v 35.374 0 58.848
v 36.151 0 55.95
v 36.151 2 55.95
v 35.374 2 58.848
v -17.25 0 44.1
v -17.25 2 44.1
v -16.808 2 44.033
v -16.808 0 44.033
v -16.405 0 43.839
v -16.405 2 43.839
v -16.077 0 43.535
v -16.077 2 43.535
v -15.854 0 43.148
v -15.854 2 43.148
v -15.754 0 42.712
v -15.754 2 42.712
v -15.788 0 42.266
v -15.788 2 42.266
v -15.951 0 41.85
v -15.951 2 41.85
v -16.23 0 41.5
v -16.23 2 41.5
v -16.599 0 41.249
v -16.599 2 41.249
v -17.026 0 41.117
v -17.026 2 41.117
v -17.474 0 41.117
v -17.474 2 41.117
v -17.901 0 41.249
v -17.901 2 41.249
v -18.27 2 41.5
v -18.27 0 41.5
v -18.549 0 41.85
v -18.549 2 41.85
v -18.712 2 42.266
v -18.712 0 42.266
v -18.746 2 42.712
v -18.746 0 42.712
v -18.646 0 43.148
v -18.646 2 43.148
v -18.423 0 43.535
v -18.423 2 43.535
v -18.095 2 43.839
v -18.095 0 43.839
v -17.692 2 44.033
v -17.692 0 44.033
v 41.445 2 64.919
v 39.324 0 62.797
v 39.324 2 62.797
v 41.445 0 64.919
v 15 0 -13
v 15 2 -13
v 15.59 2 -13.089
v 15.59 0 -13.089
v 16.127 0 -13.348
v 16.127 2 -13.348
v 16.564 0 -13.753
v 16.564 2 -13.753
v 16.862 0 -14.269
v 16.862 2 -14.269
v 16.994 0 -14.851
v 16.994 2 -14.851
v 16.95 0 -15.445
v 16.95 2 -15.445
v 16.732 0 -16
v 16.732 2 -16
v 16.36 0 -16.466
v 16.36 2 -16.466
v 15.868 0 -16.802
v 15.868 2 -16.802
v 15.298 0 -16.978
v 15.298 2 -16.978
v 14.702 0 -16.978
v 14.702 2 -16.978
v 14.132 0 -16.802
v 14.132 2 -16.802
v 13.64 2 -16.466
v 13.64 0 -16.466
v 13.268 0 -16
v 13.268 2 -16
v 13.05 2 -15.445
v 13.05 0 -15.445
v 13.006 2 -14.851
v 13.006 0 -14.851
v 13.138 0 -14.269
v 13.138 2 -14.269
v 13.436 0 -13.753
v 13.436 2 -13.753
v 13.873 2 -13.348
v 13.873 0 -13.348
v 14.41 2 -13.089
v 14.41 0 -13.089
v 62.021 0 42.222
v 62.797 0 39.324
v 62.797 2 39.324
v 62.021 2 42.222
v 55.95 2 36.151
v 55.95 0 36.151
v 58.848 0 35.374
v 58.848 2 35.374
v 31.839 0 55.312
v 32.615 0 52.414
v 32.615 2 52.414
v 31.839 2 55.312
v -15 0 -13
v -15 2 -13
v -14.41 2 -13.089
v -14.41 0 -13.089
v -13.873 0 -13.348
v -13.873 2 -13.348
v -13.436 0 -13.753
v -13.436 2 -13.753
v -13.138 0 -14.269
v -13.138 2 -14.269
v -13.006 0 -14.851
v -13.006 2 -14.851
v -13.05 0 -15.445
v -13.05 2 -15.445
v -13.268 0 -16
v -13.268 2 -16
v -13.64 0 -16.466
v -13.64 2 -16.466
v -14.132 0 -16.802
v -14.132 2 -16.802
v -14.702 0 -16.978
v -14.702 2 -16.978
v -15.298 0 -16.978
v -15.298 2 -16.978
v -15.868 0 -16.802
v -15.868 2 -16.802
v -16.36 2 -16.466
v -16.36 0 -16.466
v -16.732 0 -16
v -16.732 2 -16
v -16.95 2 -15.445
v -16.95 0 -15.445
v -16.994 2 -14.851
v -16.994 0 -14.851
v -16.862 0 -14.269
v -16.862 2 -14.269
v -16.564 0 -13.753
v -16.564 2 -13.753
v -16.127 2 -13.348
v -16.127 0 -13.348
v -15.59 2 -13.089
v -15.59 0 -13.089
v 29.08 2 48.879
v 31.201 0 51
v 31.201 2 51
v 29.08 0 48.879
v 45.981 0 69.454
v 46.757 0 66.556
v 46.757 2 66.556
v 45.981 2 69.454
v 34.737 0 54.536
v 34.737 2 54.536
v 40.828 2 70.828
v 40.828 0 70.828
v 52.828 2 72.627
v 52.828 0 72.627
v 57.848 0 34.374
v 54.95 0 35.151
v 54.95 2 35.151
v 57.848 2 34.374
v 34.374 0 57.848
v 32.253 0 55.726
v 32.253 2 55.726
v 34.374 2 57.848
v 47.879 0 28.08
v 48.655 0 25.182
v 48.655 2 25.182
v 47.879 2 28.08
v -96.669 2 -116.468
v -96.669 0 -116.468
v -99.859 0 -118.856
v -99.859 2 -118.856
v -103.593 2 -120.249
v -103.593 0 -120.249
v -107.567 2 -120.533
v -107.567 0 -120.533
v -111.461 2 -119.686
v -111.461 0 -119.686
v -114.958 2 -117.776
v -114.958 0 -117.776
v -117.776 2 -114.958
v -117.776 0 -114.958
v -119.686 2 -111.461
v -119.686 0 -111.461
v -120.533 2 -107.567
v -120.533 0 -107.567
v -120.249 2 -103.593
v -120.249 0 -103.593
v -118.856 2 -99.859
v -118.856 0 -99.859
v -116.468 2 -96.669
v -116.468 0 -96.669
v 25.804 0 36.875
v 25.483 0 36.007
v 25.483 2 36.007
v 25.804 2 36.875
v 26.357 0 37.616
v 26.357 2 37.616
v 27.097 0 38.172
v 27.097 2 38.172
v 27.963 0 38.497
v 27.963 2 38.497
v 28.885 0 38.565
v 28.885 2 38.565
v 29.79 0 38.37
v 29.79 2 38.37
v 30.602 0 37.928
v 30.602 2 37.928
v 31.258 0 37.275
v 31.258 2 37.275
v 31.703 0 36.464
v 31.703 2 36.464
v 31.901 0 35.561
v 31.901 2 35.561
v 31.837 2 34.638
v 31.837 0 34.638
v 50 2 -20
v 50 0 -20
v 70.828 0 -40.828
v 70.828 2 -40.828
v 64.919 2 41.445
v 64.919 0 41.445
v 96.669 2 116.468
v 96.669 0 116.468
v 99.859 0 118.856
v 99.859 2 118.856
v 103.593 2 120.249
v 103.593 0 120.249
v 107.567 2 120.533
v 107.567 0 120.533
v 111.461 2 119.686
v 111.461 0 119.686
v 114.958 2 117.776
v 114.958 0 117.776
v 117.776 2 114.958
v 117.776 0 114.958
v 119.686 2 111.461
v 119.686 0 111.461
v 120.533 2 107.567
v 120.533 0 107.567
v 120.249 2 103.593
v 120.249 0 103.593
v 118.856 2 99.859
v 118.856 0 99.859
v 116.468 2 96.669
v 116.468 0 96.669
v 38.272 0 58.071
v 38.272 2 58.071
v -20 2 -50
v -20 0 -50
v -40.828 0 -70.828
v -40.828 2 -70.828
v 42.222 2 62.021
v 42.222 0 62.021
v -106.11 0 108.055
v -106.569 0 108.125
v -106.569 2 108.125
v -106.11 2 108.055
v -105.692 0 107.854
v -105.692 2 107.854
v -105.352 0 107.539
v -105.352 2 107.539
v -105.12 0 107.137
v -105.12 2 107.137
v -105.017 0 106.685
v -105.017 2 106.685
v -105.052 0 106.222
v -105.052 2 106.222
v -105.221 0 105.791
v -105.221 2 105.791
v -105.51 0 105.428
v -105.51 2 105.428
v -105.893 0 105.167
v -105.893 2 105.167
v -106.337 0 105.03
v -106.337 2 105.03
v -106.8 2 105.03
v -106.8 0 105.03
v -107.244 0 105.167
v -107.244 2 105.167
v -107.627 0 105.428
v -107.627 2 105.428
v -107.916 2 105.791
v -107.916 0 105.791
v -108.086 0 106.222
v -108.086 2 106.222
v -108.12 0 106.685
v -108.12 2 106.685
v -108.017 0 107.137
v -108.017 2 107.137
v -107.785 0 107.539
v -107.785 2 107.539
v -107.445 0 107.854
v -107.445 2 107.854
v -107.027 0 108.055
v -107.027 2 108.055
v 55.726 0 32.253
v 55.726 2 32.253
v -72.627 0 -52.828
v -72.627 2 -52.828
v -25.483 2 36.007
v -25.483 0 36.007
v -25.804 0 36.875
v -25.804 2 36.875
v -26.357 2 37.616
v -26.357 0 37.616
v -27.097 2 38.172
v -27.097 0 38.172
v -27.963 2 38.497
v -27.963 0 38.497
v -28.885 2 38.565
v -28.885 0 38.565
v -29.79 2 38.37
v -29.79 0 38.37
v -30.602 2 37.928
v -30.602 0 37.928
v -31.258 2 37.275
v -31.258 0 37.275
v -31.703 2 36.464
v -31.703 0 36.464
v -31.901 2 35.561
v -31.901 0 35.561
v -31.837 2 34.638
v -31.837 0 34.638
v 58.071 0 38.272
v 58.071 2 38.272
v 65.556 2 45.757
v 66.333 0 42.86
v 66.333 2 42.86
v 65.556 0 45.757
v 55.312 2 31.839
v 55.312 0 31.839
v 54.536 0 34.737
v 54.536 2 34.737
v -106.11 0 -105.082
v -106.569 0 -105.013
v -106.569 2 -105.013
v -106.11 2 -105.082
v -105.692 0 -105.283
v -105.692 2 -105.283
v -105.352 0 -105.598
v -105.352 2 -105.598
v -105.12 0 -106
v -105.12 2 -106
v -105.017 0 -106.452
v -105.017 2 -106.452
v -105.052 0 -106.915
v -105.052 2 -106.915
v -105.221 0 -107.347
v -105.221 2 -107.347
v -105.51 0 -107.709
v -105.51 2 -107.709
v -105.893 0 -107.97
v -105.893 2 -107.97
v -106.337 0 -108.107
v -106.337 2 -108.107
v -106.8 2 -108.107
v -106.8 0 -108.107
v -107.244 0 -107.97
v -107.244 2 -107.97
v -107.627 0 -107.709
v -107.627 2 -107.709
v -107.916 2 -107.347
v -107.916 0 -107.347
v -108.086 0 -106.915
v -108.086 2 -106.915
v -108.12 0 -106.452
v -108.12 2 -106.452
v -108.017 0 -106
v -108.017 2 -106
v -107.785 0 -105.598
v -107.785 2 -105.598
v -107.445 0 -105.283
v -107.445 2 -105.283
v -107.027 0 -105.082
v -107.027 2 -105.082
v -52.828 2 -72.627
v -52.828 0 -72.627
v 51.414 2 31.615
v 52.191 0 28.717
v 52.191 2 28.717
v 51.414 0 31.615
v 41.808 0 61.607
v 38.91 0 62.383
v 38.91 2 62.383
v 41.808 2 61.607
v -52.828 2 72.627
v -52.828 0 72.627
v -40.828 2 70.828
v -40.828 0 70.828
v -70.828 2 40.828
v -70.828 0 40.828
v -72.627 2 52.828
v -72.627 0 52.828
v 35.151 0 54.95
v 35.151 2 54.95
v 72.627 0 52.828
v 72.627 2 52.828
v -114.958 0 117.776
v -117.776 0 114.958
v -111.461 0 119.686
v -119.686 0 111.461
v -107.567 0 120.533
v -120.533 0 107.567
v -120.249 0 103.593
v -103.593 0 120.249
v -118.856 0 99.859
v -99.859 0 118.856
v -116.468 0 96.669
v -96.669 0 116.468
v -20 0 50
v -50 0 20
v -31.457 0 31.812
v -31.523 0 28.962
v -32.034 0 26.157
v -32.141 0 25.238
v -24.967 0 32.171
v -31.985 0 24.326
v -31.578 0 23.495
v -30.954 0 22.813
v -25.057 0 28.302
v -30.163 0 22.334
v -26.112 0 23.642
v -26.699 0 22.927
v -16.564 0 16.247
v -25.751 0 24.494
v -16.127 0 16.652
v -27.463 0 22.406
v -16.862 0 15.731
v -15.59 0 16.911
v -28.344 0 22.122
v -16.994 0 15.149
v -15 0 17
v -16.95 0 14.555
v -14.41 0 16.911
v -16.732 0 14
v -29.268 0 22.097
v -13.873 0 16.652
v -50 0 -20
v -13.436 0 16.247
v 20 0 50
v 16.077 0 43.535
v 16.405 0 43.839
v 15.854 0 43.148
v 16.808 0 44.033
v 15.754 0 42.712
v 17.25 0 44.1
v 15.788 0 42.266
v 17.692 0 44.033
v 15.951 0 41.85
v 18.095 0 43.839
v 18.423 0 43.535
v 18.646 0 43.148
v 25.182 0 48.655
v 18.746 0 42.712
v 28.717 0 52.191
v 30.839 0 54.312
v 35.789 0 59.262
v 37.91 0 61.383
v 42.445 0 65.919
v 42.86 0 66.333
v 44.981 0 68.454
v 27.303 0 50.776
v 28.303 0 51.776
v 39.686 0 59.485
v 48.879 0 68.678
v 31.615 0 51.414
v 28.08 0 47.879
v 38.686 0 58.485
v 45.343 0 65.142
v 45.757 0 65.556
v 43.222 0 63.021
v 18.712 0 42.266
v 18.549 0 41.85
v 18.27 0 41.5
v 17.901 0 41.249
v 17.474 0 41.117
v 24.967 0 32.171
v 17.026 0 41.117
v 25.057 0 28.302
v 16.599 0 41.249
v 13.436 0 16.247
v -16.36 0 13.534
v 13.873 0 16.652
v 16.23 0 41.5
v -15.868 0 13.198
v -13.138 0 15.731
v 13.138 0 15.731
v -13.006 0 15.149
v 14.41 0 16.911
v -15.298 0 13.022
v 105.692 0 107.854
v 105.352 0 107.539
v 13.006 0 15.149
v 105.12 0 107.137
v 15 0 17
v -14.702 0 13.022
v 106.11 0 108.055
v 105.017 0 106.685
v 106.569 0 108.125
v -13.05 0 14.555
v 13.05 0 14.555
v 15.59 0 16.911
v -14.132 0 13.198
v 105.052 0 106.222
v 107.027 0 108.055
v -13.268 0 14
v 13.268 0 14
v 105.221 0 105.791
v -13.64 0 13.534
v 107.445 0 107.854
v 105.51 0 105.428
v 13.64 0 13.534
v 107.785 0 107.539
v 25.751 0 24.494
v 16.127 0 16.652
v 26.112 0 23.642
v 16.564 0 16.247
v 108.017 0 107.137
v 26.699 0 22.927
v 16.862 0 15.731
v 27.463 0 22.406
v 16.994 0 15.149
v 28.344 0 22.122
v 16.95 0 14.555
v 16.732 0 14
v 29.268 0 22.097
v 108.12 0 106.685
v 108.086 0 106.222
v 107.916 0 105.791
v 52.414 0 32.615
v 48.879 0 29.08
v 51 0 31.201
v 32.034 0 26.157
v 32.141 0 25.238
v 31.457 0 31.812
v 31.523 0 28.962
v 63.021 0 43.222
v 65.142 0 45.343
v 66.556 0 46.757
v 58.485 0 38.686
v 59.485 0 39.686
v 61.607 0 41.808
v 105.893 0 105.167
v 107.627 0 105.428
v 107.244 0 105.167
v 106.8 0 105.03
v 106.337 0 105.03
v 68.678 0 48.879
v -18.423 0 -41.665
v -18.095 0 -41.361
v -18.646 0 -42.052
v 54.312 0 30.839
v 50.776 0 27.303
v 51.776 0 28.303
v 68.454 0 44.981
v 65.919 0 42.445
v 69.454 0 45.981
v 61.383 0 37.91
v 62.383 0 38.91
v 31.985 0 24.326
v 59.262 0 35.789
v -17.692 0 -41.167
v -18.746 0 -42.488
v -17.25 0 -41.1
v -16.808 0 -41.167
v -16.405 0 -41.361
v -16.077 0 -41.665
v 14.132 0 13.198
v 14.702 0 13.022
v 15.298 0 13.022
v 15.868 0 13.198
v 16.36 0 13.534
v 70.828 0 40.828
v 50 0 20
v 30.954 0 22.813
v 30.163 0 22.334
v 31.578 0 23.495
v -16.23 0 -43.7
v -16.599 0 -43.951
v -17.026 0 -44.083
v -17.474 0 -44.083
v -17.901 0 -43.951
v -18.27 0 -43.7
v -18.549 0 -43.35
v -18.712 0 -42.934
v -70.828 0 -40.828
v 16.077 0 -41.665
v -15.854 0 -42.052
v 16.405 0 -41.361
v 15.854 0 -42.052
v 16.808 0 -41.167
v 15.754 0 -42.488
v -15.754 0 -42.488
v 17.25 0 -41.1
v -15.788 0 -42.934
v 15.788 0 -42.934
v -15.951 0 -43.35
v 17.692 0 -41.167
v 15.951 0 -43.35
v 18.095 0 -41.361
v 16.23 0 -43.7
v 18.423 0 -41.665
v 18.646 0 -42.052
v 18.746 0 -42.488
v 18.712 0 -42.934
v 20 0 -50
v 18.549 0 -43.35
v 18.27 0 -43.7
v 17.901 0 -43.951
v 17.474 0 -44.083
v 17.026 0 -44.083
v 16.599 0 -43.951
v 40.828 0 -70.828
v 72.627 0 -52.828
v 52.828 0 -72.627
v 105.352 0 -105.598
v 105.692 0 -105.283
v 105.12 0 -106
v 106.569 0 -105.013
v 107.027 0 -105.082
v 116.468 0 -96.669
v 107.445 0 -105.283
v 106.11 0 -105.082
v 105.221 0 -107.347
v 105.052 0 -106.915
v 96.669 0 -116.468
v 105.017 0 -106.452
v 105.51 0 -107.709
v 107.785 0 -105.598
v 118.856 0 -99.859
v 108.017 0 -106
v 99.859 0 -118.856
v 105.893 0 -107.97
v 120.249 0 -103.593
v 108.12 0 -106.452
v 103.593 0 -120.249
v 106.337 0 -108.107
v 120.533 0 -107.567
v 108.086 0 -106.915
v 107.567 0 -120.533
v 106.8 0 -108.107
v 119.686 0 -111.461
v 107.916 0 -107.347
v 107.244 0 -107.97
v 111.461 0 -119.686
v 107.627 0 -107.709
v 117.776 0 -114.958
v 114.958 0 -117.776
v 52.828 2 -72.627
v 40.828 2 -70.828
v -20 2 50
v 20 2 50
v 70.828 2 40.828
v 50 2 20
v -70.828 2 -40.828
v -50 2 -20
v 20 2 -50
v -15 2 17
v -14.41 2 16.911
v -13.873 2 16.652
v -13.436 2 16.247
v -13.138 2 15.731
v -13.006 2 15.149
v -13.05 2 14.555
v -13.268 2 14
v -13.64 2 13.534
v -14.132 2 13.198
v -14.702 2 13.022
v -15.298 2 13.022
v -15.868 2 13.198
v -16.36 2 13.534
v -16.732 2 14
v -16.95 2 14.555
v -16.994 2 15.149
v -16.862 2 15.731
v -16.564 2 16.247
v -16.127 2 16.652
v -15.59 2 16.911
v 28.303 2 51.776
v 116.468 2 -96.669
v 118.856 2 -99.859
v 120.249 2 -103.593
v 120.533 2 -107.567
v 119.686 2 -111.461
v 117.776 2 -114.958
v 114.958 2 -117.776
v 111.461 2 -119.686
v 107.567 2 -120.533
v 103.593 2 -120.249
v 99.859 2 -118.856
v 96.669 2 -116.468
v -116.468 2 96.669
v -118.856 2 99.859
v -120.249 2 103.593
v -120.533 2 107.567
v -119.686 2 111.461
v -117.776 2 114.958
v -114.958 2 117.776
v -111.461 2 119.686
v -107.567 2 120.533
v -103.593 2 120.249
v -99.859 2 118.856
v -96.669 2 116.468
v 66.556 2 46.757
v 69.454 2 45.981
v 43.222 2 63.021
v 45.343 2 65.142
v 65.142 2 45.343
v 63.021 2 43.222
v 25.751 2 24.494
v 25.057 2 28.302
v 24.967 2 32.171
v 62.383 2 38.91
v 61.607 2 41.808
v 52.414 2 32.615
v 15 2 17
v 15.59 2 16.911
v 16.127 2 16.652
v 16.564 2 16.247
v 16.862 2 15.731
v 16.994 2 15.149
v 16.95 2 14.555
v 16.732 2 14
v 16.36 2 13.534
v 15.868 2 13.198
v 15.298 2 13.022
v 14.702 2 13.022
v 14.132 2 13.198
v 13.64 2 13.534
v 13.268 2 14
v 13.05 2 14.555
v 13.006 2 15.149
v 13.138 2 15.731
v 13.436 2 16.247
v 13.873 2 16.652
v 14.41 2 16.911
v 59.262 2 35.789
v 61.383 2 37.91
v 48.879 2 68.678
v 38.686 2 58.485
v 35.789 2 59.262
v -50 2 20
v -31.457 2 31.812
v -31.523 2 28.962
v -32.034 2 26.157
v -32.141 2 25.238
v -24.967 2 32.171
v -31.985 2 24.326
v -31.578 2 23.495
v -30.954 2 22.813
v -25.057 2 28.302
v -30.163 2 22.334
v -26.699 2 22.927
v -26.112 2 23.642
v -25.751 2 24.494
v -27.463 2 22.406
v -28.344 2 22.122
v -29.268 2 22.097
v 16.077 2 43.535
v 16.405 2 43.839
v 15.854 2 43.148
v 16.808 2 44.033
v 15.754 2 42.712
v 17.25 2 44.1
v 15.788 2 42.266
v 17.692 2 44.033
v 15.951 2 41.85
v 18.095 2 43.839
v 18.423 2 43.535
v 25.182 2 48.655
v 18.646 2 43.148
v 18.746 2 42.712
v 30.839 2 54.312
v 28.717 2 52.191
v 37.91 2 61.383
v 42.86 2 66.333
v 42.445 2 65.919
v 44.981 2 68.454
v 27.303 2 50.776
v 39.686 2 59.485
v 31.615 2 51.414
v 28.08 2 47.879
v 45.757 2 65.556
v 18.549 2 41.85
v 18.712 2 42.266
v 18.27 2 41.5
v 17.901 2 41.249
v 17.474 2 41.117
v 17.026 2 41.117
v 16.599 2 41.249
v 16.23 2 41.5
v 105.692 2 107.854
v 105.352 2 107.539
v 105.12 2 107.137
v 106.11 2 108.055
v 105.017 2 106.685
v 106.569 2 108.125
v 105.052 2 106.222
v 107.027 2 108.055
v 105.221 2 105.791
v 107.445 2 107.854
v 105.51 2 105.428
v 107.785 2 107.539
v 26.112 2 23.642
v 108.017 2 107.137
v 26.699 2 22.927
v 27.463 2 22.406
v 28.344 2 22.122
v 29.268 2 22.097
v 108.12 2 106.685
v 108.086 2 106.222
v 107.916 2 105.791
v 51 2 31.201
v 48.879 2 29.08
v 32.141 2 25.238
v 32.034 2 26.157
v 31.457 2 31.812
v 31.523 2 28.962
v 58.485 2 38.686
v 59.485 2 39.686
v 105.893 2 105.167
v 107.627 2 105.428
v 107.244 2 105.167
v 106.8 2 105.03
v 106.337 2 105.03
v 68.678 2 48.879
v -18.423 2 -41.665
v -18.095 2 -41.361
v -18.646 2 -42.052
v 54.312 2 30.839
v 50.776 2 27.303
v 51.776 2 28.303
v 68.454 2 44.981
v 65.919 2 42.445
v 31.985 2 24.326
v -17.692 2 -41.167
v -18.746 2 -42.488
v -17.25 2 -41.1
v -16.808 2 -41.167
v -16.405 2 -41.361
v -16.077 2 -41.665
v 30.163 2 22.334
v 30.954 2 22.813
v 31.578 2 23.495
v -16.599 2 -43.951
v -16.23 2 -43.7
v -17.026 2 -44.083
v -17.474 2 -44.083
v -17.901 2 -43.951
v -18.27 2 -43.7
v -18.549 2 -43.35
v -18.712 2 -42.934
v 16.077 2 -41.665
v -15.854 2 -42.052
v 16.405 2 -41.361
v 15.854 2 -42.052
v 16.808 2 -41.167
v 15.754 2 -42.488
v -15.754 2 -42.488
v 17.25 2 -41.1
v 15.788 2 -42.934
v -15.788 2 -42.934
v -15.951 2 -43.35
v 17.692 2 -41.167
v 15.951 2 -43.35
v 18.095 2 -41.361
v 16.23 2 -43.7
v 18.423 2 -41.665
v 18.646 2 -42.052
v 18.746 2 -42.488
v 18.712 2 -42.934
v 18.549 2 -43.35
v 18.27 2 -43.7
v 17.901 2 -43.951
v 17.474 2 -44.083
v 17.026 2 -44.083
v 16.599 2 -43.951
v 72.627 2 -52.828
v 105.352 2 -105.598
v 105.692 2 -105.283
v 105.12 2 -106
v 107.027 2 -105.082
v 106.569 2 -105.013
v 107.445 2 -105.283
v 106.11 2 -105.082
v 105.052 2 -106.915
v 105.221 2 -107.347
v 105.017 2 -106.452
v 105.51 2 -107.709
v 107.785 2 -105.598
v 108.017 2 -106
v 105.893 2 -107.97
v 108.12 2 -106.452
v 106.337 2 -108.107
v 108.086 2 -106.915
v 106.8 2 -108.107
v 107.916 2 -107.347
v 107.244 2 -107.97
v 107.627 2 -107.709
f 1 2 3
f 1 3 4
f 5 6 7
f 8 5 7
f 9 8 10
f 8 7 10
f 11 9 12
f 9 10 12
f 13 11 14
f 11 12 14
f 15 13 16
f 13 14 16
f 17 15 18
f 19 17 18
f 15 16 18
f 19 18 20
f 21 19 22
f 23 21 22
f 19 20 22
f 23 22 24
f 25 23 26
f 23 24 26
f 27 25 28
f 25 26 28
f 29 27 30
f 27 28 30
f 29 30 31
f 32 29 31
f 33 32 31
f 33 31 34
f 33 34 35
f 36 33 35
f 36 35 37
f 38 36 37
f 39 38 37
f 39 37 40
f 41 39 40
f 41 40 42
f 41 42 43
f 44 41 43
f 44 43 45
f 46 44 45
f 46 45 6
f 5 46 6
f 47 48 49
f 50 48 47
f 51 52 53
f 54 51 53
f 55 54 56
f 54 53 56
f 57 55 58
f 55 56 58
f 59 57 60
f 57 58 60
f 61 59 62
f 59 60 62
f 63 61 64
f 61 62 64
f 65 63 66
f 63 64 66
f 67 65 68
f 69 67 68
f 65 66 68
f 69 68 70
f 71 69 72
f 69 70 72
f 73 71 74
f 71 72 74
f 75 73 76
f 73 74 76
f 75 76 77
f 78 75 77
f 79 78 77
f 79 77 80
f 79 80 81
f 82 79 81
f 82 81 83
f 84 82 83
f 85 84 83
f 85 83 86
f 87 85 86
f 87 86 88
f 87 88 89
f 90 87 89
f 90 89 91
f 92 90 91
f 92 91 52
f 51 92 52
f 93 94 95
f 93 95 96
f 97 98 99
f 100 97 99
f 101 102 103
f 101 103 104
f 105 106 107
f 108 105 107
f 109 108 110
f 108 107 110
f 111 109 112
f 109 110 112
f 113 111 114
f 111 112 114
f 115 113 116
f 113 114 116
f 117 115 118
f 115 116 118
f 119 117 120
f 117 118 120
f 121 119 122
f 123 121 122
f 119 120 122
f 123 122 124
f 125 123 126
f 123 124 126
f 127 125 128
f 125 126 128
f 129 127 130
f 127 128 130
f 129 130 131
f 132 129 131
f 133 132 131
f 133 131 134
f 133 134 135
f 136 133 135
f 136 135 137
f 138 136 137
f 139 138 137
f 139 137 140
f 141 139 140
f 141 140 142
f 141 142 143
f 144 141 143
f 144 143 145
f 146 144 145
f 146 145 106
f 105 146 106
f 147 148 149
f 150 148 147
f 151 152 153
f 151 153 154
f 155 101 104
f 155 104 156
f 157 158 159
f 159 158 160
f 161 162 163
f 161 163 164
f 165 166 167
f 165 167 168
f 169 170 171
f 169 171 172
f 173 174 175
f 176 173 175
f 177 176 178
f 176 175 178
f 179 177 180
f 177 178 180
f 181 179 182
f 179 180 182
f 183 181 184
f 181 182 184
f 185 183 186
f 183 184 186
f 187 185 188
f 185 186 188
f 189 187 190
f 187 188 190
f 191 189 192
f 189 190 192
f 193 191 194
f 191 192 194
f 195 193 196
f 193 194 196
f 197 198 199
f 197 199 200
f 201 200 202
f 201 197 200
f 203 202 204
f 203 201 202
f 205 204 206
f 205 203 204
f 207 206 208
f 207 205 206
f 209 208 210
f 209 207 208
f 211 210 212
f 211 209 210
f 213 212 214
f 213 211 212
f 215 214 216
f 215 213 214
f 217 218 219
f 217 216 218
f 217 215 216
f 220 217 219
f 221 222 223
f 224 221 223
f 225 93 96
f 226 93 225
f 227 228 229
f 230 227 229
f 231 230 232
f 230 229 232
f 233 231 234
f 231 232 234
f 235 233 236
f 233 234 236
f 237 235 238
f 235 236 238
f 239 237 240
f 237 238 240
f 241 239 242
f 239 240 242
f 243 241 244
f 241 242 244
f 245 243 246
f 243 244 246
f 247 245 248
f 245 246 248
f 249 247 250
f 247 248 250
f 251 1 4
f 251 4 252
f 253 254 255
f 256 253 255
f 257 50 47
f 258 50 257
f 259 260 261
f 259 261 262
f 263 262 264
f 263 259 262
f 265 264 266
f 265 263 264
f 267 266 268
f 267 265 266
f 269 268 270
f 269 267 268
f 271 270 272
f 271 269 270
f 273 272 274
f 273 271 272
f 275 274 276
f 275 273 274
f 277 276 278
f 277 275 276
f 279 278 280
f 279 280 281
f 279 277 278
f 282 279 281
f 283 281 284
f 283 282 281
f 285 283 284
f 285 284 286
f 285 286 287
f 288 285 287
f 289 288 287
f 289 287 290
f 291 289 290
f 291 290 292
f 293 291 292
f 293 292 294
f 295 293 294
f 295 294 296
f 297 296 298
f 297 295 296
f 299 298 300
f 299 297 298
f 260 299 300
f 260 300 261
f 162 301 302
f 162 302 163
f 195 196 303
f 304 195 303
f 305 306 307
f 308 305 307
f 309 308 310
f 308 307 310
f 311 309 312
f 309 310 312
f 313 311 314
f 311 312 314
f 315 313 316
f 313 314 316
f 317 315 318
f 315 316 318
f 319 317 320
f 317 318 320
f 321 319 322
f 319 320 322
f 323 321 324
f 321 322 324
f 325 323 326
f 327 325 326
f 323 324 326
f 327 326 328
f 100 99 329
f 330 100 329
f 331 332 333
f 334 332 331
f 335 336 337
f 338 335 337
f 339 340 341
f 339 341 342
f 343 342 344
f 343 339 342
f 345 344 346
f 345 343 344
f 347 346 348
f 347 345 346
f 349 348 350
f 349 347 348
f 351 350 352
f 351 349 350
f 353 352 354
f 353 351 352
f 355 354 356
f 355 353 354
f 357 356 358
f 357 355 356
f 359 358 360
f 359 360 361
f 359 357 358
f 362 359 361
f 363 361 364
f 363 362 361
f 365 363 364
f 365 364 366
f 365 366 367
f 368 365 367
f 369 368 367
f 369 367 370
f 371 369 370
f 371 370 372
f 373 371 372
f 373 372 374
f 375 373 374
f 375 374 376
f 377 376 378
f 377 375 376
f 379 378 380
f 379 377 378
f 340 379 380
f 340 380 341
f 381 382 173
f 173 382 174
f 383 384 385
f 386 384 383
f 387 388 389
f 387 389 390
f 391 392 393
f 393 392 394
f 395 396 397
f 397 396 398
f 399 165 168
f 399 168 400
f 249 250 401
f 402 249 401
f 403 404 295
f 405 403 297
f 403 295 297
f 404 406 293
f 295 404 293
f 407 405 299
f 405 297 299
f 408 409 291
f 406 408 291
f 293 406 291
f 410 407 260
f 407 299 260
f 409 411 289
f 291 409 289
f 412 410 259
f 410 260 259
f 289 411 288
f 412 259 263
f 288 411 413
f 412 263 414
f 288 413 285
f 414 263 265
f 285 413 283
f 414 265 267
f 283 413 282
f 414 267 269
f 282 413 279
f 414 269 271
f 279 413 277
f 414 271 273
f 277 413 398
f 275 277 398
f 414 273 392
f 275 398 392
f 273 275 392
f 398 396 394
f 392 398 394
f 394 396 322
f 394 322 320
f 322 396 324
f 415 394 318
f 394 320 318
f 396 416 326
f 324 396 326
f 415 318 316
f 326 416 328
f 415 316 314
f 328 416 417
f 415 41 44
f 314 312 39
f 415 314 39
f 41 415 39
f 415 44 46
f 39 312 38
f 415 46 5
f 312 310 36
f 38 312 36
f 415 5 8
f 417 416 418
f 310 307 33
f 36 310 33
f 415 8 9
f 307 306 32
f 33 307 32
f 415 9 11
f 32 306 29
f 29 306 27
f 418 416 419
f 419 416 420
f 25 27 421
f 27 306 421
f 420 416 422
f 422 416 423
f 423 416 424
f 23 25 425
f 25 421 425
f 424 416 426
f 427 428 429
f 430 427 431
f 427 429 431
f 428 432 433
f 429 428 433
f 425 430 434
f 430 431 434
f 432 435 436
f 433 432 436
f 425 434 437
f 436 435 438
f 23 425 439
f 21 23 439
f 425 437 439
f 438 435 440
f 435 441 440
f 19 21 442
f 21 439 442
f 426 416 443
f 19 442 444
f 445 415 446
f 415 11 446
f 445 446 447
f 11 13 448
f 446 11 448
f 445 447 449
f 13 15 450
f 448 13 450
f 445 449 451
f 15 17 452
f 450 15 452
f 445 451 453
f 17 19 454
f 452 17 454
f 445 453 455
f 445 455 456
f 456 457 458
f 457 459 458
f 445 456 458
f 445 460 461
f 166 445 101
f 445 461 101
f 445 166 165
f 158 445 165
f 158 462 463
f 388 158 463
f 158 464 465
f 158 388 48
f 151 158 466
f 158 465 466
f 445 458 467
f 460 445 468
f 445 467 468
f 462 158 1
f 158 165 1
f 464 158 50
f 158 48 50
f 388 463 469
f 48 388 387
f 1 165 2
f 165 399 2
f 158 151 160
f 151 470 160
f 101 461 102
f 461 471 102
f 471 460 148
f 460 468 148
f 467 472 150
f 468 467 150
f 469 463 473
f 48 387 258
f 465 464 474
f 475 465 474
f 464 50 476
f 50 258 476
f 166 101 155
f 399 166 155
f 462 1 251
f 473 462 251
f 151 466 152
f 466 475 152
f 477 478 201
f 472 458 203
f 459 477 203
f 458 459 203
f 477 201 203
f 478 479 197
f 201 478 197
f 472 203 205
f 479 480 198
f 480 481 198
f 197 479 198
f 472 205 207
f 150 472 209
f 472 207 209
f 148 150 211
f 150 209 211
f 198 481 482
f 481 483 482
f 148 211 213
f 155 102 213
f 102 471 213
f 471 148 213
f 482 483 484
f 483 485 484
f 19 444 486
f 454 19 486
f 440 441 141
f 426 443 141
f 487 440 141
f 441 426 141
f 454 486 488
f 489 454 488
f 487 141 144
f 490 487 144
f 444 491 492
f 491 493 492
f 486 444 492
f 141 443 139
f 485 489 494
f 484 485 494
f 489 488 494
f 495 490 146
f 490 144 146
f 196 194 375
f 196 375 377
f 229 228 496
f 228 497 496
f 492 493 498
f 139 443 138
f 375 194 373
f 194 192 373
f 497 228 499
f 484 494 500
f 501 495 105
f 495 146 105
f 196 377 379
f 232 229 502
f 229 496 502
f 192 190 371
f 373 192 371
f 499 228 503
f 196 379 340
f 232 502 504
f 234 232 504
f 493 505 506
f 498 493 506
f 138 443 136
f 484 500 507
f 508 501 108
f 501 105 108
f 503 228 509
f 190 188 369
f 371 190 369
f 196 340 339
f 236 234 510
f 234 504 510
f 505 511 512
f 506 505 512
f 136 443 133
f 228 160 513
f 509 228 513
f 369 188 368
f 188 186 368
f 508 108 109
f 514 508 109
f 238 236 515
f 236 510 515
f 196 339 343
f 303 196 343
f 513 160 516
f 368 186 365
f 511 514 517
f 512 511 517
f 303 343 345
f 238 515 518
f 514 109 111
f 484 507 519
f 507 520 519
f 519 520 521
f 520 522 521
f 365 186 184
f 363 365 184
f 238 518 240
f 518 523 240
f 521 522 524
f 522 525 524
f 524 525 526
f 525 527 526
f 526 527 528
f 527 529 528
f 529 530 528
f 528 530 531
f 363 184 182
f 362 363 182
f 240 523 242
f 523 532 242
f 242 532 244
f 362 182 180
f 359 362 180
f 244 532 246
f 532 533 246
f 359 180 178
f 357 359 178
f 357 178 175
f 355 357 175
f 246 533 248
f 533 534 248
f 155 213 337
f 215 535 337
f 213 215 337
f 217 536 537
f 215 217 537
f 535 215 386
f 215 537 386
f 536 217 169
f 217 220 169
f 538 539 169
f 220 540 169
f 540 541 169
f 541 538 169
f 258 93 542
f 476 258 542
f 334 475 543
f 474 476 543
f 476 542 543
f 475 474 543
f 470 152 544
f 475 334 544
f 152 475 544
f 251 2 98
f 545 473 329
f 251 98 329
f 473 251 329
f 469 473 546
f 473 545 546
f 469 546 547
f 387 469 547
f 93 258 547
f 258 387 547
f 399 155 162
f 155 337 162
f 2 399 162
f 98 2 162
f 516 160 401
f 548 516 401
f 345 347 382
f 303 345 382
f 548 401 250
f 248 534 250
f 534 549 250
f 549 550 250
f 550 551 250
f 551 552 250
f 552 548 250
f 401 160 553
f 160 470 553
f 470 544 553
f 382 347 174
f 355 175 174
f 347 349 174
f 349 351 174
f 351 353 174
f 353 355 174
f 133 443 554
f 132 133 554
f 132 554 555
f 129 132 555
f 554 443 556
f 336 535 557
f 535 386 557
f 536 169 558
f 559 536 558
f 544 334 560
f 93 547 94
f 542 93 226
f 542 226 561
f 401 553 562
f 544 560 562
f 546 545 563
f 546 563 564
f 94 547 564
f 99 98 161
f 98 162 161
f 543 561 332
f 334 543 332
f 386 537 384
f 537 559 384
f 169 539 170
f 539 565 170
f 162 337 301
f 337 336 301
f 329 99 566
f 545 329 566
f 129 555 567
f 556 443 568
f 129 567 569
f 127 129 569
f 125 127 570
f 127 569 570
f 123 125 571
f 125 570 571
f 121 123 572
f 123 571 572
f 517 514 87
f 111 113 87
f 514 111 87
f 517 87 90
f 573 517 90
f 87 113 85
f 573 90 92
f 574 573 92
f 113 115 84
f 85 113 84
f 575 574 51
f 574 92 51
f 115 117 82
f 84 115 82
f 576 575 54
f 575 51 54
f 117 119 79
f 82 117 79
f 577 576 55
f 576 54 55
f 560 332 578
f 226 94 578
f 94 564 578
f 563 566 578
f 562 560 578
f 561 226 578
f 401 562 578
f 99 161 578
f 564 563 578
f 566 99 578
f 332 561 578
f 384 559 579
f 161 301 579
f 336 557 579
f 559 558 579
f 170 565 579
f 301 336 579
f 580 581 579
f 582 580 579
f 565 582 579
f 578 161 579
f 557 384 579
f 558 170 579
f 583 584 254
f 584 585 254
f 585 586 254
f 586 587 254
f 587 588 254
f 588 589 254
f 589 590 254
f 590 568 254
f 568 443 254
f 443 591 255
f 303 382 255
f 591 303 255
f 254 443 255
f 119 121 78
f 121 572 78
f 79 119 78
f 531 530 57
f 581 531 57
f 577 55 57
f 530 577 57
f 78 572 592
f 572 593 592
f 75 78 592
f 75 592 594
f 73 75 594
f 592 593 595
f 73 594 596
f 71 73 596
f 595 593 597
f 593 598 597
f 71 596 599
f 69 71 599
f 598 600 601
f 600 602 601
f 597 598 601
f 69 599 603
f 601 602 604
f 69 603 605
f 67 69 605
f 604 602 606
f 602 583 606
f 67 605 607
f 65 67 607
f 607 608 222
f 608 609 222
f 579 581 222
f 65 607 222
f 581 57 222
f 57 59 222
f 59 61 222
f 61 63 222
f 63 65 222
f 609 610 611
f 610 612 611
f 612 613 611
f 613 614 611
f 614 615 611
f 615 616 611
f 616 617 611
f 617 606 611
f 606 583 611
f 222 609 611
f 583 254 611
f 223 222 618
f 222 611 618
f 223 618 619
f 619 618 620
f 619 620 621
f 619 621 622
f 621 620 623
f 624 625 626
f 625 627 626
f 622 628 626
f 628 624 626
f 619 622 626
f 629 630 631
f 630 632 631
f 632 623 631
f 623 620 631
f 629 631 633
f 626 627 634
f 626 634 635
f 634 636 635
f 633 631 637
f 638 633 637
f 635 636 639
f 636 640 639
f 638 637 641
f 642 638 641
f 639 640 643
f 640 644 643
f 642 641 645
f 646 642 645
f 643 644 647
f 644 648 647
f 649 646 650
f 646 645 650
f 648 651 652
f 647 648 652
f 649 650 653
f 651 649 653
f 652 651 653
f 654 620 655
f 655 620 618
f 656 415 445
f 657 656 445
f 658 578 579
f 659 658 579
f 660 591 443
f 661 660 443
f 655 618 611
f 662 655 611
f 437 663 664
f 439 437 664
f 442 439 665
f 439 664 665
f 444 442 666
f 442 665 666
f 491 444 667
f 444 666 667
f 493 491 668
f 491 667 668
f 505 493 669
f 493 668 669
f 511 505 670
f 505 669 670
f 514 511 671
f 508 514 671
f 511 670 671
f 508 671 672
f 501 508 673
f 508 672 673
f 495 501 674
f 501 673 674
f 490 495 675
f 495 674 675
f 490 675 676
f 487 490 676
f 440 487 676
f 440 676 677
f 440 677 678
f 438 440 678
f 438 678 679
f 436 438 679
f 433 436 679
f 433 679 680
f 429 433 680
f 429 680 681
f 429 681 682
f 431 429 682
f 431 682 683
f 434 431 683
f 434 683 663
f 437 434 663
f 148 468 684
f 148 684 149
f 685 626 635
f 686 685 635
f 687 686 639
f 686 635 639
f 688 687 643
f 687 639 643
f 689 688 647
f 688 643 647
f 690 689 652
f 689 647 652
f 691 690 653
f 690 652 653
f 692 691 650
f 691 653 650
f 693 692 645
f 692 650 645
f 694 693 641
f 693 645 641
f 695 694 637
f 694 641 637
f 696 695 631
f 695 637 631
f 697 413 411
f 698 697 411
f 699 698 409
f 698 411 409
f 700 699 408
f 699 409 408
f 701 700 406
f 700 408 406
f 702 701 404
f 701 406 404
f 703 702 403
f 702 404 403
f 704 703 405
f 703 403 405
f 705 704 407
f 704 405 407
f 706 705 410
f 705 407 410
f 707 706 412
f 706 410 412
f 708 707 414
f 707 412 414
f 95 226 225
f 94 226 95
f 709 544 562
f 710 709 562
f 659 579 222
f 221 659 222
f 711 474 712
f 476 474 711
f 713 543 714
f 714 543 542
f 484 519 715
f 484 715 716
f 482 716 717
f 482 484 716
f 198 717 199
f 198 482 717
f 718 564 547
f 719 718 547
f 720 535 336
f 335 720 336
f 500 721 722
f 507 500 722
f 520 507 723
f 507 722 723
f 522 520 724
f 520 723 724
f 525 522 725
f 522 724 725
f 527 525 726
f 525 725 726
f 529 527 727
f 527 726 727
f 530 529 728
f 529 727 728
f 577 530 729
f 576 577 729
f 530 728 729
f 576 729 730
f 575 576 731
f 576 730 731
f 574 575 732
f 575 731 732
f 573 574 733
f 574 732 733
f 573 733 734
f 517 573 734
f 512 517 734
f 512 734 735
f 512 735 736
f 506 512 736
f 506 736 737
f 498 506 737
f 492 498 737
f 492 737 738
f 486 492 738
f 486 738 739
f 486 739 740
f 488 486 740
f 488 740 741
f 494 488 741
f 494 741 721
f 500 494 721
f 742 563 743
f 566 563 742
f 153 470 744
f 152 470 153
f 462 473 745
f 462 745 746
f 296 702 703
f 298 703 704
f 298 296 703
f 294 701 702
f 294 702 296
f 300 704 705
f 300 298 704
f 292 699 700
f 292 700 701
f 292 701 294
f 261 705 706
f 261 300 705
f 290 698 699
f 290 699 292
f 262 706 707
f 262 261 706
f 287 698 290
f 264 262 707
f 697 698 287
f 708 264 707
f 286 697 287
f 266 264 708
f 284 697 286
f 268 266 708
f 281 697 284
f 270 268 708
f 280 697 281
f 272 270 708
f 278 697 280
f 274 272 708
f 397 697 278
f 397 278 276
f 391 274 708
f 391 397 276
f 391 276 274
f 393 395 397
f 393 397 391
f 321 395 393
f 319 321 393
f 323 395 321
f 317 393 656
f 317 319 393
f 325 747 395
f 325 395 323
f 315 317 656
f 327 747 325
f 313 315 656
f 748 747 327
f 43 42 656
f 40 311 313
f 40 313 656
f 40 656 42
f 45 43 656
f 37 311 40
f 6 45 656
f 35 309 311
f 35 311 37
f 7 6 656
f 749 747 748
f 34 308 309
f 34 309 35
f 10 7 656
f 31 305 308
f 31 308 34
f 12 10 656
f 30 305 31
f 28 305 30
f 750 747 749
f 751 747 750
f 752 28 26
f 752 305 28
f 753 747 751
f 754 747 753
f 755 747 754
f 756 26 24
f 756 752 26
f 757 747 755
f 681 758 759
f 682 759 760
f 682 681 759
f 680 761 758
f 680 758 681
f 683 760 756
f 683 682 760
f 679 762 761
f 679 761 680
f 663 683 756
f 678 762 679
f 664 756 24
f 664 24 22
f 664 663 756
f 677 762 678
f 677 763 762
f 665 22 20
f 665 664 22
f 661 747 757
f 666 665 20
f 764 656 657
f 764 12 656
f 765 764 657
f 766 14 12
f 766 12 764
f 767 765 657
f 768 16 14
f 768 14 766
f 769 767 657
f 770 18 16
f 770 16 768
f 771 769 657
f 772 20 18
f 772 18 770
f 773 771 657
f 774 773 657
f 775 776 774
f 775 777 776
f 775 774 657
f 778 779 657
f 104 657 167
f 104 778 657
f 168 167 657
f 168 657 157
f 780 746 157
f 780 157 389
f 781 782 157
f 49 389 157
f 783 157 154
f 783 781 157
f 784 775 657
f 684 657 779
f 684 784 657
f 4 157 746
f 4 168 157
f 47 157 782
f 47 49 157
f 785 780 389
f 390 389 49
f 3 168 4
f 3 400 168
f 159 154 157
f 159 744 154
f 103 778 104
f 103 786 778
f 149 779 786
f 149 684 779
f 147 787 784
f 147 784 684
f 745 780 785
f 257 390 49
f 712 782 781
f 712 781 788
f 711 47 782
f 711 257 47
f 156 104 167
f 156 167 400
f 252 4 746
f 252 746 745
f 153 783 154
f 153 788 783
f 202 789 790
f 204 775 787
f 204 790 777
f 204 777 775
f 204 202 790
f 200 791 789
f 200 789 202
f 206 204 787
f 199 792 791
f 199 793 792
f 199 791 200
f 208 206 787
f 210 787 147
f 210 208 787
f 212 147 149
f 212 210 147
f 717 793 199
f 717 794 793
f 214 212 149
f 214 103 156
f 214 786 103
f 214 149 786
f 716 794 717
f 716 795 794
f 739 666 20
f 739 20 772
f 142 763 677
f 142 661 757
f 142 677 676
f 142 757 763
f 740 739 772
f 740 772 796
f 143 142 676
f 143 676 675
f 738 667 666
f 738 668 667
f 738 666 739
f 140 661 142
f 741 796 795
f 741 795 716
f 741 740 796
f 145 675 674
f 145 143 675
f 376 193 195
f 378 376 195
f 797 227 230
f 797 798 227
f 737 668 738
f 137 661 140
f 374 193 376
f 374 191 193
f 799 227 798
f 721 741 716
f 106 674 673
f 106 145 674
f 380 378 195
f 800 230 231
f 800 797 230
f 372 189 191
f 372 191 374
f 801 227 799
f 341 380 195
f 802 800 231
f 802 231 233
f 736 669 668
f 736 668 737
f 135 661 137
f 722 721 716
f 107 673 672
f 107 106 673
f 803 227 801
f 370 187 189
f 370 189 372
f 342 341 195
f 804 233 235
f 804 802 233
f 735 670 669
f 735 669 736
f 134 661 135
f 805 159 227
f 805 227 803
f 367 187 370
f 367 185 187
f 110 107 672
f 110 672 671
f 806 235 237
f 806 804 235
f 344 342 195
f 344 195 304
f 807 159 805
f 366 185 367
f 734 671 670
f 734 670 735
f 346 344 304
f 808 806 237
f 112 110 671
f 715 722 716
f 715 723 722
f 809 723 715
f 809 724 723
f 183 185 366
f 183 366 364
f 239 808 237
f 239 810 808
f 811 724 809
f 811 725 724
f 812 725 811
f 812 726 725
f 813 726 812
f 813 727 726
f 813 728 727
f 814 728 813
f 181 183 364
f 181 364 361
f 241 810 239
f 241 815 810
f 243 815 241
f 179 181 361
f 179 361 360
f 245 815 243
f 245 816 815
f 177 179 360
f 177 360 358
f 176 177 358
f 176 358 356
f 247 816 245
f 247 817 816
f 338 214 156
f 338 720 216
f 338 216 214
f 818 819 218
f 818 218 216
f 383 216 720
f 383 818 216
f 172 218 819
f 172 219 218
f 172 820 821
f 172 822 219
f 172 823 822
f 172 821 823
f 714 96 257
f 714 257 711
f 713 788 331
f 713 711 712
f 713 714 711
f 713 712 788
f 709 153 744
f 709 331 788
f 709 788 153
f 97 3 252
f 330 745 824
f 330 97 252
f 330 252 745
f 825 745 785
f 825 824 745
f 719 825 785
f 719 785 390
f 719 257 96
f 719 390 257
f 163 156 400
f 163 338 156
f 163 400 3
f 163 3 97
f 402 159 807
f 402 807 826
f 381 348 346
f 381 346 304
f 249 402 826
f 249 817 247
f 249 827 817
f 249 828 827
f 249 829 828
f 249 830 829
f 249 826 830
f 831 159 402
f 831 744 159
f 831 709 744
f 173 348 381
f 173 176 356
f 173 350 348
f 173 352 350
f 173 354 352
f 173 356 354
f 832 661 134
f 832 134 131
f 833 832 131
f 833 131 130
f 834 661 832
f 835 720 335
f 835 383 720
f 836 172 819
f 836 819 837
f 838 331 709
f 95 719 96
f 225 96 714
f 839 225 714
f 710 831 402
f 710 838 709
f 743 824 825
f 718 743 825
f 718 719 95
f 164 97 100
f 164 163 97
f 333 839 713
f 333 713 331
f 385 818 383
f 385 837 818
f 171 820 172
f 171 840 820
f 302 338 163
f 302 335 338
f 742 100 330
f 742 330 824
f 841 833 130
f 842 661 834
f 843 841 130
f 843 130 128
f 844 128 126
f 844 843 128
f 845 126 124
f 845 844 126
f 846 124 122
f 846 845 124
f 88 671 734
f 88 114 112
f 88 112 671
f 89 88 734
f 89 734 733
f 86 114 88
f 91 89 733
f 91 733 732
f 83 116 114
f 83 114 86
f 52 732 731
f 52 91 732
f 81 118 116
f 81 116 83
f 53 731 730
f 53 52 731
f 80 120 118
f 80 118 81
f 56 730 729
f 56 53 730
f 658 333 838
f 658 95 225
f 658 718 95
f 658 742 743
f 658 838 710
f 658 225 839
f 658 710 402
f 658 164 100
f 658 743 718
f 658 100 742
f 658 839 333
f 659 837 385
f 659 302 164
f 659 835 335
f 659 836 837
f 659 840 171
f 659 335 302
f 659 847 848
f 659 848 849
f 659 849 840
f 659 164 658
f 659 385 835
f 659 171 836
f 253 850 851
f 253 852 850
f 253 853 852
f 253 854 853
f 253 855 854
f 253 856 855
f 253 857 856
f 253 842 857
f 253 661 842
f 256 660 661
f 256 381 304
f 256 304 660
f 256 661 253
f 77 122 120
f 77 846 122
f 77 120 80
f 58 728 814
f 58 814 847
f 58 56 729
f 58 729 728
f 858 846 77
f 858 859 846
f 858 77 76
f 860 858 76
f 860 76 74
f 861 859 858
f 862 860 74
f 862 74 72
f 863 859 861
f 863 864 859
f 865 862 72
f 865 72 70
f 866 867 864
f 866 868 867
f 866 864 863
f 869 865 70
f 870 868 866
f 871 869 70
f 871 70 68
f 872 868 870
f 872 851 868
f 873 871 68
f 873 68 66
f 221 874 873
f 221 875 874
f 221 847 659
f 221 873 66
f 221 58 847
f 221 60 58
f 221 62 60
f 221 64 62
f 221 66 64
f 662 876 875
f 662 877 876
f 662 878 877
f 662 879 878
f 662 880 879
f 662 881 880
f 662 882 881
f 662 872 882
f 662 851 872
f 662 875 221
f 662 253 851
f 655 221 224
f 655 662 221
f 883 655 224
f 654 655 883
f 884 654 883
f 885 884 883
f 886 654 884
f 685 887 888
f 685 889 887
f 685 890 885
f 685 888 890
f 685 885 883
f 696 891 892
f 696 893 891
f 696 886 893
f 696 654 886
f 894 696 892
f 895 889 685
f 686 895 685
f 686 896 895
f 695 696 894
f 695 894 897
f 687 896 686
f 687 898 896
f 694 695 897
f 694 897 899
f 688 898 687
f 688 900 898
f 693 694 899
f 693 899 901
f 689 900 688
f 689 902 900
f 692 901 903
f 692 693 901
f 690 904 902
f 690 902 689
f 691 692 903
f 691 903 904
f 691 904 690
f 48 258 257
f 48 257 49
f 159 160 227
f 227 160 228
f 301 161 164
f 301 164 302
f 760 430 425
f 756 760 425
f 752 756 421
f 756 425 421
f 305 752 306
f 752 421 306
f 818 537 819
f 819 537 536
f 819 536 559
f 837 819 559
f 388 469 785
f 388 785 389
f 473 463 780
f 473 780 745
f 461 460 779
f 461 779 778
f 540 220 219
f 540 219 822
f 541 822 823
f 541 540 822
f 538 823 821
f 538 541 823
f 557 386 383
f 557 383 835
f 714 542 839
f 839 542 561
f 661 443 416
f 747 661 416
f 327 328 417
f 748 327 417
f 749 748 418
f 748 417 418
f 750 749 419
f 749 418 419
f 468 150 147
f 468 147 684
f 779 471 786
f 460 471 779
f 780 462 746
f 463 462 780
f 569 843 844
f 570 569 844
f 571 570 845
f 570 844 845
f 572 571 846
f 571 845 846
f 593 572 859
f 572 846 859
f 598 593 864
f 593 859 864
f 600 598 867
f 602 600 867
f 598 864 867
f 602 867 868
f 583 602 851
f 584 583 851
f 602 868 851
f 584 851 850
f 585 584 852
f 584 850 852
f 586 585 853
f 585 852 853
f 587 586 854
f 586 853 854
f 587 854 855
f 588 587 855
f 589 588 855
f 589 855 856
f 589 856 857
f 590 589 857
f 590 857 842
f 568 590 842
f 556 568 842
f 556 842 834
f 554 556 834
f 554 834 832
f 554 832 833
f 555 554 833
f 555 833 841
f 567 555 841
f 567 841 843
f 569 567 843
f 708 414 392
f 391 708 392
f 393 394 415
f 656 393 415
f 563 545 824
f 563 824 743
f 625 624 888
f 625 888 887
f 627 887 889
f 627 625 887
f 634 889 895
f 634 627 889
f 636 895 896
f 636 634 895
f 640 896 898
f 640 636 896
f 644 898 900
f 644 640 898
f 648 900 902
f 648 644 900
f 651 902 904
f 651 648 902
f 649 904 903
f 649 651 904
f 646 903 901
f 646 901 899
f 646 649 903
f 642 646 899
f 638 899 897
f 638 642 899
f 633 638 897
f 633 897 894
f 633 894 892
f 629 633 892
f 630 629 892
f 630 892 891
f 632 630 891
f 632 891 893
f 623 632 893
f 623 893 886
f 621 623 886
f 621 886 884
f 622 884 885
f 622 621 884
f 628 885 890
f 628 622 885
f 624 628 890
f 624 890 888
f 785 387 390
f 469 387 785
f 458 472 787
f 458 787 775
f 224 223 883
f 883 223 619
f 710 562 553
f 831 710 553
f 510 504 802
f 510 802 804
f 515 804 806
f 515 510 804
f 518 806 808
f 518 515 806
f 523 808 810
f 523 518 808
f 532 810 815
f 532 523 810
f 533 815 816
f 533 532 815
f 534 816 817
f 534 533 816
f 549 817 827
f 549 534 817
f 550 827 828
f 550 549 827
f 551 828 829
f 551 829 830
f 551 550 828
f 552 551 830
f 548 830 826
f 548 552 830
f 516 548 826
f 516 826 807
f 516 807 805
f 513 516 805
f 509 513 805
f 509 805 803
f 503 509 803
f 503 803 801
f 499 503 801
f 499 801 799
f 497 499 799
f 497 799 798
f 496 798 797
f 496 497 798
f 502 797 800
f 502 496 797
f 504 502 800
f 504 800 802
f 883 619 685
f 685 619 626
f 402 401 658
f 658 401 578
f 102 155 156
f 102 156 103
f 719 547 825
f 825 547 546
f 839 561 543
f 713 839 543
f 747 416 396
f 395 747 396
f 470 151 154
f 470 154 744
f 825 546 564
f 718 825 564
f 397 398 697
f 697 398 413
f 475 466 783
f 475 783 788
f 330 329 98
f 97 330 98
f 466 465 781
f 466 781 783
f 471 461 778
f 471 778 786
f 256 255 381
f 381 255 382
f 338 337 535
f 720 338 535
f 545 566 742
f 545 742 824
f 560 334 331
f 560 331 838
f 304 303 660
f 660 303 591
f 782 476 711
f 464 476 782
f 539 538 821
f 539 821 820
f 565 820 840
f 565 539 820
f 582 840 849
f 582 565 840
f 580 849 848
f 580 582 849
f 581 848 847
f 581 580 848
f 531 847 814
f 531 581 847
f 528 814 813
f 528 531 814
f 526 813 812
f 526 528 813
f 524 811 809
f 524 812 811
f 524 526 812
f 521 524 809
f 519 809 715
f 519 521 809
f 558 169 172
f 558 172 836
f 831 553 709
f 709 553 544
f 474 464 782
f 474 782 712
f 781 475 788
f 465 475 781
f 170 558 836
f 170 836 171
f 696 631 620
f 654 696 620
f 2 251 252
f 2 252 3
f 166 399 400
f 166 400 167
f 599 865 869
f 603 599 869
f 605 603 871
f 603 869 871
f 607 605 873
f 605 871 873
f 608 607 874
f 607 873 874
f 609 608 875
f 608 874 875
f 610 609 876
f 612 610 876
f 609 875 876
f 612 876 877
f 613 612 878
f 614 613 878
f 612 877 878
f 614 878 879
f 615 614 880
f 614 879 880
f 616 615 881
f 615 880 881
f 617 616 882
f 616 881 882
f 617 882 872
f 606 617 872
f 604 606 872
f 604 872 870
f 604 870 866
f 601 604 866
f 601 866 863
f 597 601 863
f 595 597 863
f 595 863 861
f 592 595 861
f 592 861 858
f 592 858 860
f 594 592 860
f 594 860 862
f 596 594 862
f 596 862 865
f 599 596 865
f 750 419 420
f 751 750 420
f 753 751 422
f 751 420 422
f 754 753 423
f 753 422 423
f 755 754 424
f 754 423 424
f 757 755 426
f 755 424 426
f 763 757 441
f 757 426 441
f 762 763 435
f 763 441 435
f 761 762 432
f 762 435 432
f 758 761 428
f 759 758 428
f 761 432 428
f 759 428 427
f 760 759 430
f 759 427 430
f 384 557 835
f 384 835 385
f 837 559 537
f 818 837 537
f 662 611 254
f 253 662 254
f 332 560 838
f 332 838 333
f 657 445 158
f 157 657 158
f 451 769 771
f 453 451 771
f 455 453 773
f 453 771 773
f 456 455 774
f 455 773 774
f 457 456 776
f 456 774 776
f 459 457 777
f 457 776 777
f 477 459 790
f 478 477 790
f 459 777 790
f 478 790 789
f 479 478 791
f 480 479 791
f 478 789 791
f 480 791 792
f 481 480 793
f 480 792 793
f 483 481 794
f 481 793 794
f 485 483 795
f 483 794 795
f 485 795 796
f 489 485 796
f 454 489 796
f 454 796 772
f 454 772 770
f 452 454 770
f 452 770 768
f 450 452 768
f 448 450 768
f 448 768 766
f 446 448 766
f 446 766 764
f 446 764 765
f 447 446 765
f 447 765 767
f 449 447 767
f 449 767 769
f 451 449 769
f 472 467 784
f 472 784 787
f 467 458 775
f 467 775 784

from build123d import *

# Parameters (mm, degrees)
SKETCH1_R               = 1.556
BOSS_EXTRUDE1_DEPTH     = 2
SKETCH3_R               = 2
SKETCH3_R_2             = 1.5
CUT_EXTRUDE1_DEPTH      = 10
CUT_EXTRUDE2_DEPTH      = 171.521397129
CUT_EXTRUDE2_DEPTH_BACK = 171.521397129
CUT_EXTRUDE3_DEPTH      = 171.521397129
CUT_EXTRUDE3_DEPTH_BACK = 171.521397129


with BuildPart() as part:
    # Sketch1 → Boss-Extrude1 (new body)
    with BuildSketch(Plane(origin=(0, 0, 0), x_dir=(1, 0, 0), z_dir=(0, 1, 0))):
        with BuildLine():
            Line((-70.828427125, 40.828427125), (-50, 20))
            Line((-50, 20), (-50, -20))
            Line((-50, -20), (-70.828427125, -40.828427125))
            Line((-70.828427125, -40.828427125), (-72.627416998, -52.828427125))
            Line((-72.627416998, -52.828427125), (-116.468037432, -96.669047558))
            ThreePointArc((-116.468037432, -96.669047558), (-116.468037432, -116.468037432), (-96.669047558, -116.468037432))
            Line((-96.669047558, -116.468037432), (-52.828427125, -72.627416998))
            Line((-52.828427125, -72.627416998), (-40.828427125, -70.828427125))
            Line((-40.828427125, -70.828427125), (-20, -50))
            Line((-20, -50), (20, -50))
            Line((20, -50), (40.828427125, -70.828427125))
            Line((40.828427125, -70.828427125), (52.828427125, -72.627416998))
            Line((52.828427125, -72.627416998), (96.669047558, -116.468037432))
            ThreePointArc((96.669047558, -116.468037432), (116.468037432, -116.468037432), (116.468037432, -96.669047558))
            Line((116.468037432, -96.669047558), (72.627416998, -52.828427125))
            Line((72.627416998, -52.828427125), (70.828427125, -40.828427125))
            Line((70.828427125, -40.828427125), (50, -20))
            Line((50, -20), (50, 20))
            Line((50, 20), (70.828427125, 40.828427125))
            Line((70.828427125, 40.828427125), (72.627416998, 52.828427125))
            Line((72.627416998, 52.828427125), (116.468037432, 96.669047558))
            ThreePointArc((116.468037432, 96.669047558), (116.468037432, 116.468037432), (96.669047558, 116.468037432))
            Line((96.669047558, 116.468037432), (52.828427125, 72.627416998))
            Line((52.828427125, 72.627416998), (40.828427125, 70.828427125))
            Line((40.828427125, 70.828427125), (20, 50))
            Line((20, 50), (-20, 50))
            Line((-20, 50), (-40.828427125, 70.828427125))
            Line((-40.828427125, 70.828427125), (-52.828427125, 72.627416998))
            Line((-52.828427125, 72.627416998), (-96.669047558, 116.468037432))
            ThreePointArc((-96.669047558, 116.468037432), (-116.468037432, 116.468037432), (-116.468037432, 96.669047558))
            Line((-116.468037432, 96.669047558), (-72.627416998, 52.828427125))
            Line((-72.627416998, 52.828427125), (-70.828427125, 40.828427125))
        make_face()
        with Locations(Location((-106.568542495, 106.568542495, 0), (0, 0, 270))):
            Circle(SKETCH1_R, mode=Mode.SUBTRACT)
        with Locations(Location((106.568542495, 106.568542495, 0), (0, 0, 270))):
            Circle(SKETCH1_R, mode=Mode.SUBTRACT)
        with Locations(Location((-106.568542495, -106.568542495, 0), (0, 0, 270))):
            Circle(SKETCH1_R, mode=Mode.SUBTRACT)
        with Locations(Location((106.568542495, -106.568542495, 0), (0, 0, 270))):
            Circle(SKETCH1_R, mode=Mode.SUBTRACT)
    extrude(amount=BOSS_EXTRUDE1_DEPTH)

    # Sketch3 → Cut-Extrude1 (cut)
    with BuildSketch(Plane(origin=(0, 2, 0), x_dir=(1, 0, 0), z_dir=(0, 1, 0))):
        with Locations(Location((-15, 15, 0), (0, 0, 270))):
            Circle(SKETCH3_R)
        with Locations(Location((-17.25, 42.6, 0), (0, 0, 270))):
            Circle(SKETCH3_R_2)
        with Locations(Location((15, 15, 0), (0, 0, 270))):
            Circle(SKETCH3_R)
        with Locations(Location((17.25, 42.6, 0), (0, 0, 270))):
            Circle(SKETCH3_R_2)
        with Locations(Location((15, -15, 0), (0, 0, 270))):
            Circle(SKETCH3_R)
        with Locations(Location((-15, -15, 0), (0, 0, 270))):
            Circle(SKETCH3_R)
        with Locations(Location((17.25, -42.6, 0), (0, 0, 270))):
            Circle(SKETCH3_R_2)
        with Locations(Location((-17.25, -42.6, 0), (0, 0, 270))):
            Circle(SKETCH3_R_2)
    extrude(amount=-CUT_EXTRUDE1_DEPTH, mode=Mode.SUBTRACT)

    # Sketch4 → Cut-Extrude2 (cut, two sides: drawn at the far end of the back side and taken through both)
    with BuildSketch(Plane(origin=(0, 2, 0), x_dir=(1, 0, 0), z_dir=(0, 1, 0)).offset(-CUT_EXTRUDE2_DEPTH_BACK)):
        with BuildLine():
            ThreePointArc((25.75051417, -24.493590073), (24.93554726, -30.234601125), (25.482776992, -36.007288418))
            ThreePointArc((25.482776992, -36.007288418), (29.344558273, -38.499605681), (31.836875536, -34.637824401))
            ThreePointArc((31.836875536, -34.637824401), (31.433790571, -30.385709941), (32.034088562, -26.156927943))
            ThreePointArc((32.034088562, -26.156927943), (29.723970301, -22.183471812), (25.75051417, -24.493590073))
        make_face()
        with BuildLine():
            ThreePointArc((-25.75051417, -24.493590073), (-24.93554726, -30.234601125), (-25.482776992, -36.007288418))
            ThreePointArc((-25.482776992, -36.007288418), (-29.344558273, -38.499605681), (-31.836875536, -34.637824401))
            ThreePointArc((-31.836875536, -34.637824401), (-31.433790571, -30.385709941), (-32.034088562, -26.156927943))
            ThreePointArc((-32.034088562, -26.156927943), (-29.723970301, -22.183471812), (-25.75051417, -24.493590073))
        make_face()
    extrude(amount=CUT_EXTRUDE2_DEPTH + CUT_EXTRUDE2_DEPTH_BACK, mode=Mode.SUBTRACT)

    # Sketch5 → Cut-Extrude3 (cut, two sides: drawn at the far end of the back side and taken through both)
    with BuildSketch(Plane(origin=(0, 2, 0), x_dir=(1, 0, 0), z_dir=(0, 1, 0)).offset(-CUT_EXTRUDE3_DEPTH_BACK)):
        Polygon((25.181912304, -48.655136792), (27.303232648, -50.776457135), (28.079689783, -47.878679656), align=None)
        Polygon((29.079689783, -48.878679656), (28.303232648, -51.776457135), (31.201010127, -51), align=None)
        Polygon((28.71744621, -52.190670698), (30.838766554, -54.311991041), (31.615223689, -51.414213562), align=None)
        Polygon((32.615223689, -52.414213562), (31.838766554, -55.311991041), (34.736544033, -54.535533906), align=None)
        Polygon((32.252980116, -55.726204604), (34.37430046, -57.847524947), (35.150757595, -54.949747468), align=None)
        Polygon((36.150757595, -55.949747468), (35.37430046, -58.847524947), (38.272077939, -58.071067812), align=None)
        Polygon((35.788514022, -59.26173851), (37.909834366, -61.383058853), (38.686291501, -58.485281374), align=None)
        Polygon((39.686291501, -59.485281374), (38.909834366, -62.383058853), (41.807611845, -61.606601718), align=None)
        Polygon((39.324047928, -62.797272415), (41.445368272, -64.918592759), (42.221825407, -62.02081528), align=None)
        Polygon((43.221825407, -63.02081528), (42.445368272, -65.918592759), (45.343145751, -65.142135624), align=None)
        Polygon((42.859581834, -66.332806321), (44.980902178, -68.454126665), (45.757359313, -65.556349186), align=None)
        Polygon((46.757359313, -66.556349186), (45.980902178, -69.454126665), (48.878679656, -68.67766953), align=None)
        Polygon((68.67766953, -48.878679656), (66.556349186, -46.757359313), (69.454126665, -45.980902178), align=None)
        Polygon((65.556349186, -45.757359313), (68.454126665, -44.980902178), (66.332806321, -42.859581834), align=None)
        Polygon((65.142135624, -45.343145751), (63.02081528, -43.221825407), (65.918592759, -42.445368272), align=None)
        Polygon((62.02081528, -42.221825407), (64.918592759, -41.445368272), (62.797272415, -39.324047928), align=None)
        Polygon((61.606601718, -41.807611845), (59.485281374, -39.686291501), (62.383058853, -38.909834366), align=None)
        Polygon((58.485281374, -38.686291501), (61.383058853, -37.909834366), (59.26173851, -35.788514022), align=None)
        Polygon((58.071067812, -38.272077939), (55.949747468, -36.150757595), (58.847524947, -35.37430046), align=None)
        Polygon((54.949747468, -35.150757595), (57.847524947, -34.37430046), (55.726204604, -32.252980116), align=None)
        Polygon((54.535533906, -34.736544033), (52.414213562, -32.615223689), (55.311991041, -31.838766554), align=None)
        Polygon((51.414213562, -31.615223689), (54.311991041, -30.838766554), (52.190670698, -28.71744621), align=None)
        Polygon((51, -31.201010127), (48.878679656, -29.079689783), (51.776457135, -28.303232648), align=None)
        Polygon((47.878679656, -28.079689783), (50.776457135, -27.303232648), (48.655136792, -25.181912304), align=None)
    extrude(amount=CUT_EXTRUDE3_DEPTH + CUT_EXTRUDE3_DEPTH_BACK, mode=Mode.SUBTRACT)


solid = part.part
